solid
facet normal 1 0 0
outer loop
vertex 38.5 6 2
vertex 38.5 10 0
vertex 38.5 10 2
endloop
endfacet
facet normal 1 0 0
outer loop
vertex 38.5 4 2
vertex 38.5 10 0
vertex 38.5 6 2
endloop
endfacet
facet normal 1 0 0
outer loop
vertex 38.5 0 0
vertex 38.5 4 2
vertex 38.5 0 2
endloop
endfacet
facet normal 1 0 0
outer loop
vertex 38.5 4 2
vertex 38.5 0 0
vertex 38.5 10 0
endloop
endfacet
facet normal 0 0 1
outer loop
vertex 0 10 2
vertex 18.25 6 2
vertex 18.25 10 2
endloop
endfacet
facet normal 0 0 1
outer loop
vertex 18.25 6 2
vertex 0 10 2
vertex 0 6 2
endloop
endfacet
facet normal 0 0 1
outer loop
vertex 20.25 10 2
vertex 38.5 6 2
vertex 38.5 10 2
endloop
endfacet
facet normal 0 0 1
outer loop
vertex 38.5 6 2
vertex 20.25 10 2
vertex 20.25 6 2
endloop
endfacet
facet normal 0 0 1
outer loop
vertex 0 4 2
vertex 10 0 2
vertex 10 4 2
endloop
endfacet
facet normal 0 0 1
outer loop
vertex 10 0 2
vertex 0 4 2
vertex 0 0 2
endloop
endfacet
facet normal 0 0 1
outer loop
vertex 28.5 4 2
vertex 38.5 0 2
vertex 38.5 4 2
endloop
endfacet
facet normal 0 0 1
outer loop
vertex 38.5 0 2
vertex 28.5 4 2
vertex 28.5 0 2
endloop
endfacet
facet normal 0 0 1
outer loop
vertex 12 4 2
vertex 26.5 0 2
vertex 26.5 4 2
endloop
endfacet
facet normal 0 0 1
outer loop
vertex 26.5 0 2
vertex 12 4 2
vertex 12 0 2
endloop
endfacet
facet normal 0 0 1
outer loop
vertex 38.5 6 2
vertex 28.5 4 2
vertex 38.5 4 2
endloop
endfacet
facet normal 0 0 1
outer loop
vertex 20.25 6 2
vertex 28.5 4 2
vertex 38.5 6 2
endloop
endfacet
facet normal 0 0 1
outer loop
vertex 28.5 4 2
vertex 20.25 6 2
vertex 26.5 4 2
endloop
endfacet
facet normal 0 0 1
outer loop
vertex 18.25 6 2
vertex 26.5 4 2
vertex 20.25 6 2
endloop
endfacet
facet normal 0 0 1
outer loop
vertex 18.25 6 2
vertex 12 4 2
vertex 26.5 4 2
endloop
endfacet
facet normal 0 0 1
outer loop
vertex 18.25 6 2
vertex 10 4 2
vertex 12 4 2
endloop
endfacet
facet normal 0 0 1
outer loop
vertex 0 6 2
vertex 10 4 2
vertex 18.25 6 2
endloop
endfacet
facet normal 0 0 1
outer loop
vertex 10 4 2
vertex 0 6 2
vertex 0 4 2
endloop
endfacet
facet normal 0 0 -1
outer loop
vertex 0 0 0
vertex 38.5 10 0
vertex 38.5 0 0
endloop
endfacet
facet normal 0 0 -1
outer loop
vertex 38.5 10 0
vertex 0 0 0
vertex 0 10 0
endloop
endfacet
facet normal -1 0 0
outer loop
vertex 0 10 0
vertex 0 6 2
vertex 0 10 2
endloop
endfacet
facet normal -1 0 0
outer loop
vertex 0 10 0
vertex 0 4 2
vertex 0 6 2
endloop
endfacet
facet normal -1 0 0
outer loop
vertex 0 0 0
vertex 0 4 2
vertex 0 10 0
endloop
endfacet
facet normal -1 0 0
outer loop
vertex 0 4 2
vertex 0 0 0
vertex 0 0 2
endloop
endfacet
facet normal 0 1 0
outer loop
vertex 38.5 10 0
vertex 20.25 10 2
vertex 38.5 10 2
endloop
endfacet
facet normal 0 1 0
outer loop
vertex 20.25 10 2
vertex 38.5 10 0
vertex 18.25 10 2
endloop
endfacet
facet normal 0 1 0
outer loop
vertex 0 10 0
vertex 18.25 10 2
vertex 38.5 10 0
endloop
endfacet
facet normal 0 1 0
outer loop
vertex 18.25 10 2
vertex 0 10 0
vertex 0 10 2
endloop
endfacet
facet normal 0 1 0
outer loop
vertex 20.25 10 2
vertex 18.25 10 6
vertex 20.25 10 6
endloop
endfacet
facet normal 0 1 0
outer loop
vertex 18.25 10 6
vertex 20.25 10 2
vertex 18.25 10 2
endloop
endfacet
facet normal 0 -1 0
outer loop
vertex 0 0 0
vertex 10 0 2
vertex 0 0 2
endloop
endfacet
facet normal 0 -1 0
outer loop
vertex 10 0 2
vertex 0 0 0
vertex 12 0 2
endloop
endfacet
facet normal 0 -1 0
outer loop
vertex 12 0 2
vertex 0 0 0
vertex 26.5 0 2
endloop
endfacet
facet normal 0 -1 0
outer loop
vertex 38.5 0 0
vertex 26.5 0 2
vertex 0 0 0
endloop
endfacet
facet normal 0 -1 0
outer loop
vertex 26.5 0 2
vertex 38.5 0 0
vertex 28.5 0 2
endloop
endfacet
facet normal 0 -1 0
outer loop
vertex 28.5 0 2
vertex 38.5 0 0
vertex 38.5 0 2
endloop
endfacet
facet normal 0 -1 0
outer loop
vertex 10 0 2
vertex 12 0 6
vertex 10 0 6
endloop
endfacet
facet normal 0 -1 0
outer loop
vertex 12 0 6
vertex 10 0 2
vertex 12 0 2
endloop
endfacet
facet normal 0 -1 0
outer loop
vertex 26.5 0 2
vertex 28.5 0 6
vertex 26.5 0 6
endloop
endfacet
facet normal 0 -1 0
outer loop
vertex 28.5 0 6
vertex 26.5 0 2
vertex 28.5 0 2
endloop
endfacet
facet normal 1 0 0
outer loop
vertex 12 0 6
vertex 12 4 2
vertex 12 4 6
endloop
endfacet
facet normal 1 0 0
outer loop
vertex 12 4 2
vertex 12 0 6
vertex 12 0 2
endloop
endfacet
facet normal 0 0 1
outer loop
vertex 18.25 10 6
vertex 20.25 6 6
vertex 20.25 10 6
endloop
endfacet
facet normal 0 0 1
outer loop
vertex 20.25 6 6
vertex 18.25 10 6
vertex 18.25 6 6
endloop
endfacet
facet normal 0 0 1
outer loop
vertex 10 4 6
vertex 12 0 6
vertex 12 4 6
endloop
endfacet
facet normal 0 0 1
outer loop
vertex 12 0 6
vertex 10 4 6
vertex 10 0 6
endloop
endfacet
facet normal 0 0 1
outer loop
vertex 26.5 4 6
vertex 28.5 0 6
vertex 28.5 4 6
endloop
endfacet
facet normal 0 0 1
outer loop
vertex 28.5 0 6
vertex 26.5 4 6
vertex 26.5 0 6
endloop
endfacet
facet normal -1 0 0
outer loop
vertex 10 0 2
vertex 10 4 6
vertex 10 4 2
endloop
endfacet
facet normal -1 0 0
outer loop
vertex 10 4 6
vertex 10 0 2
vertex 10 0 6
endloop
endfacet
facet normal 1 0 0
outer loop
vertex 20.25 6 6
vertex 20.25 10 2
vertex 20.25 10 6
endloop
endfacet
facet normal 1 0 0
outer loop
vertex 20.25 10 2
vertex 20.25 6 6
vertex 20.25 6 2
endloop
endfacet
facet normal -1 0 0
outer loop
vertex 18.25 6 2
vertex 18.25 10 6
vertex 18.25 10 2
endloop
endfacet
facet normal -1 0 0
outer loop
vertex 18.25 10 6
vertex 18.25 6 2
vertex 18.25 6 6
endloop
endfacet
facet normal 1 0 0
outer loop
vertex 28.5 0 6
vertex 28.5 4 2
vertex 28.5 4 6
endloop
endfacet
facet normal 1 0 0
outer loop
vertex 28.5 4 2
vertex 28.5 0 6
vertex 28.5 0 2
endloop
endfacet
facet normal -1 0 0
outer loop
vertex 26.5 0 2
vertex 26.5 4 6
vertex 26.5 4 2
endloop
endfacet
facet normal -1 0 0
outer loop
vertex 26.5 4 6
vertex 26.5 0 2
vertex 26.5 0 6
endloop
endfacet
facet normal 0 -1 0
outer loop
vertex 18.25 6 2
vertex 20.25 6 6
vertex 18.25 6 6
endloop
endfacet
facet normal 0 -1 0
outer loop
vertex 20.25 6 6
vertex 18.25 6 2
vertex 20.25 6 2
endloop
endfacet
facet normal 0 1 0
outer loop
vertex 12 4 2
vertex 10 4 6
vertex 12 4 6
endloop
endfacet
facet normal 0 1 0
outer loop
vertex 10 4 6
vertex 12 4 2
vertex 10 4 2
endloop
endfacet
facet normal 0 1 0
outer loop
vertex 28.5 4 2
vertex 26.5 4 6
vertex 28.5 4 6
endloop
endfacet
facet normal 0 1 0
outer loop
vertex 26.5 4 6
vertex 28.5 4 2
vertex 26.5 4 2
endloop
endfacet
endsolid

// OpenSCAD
// How wide should the slot be that is cut down the middle? e.g. (How thick is your card, in millimeters?)
slotWidth = 2; // the slot width in millimeters
slotOffset = (10 - slotWidth)/2;


difference() {
	// Draw the base and the three vertical bars
	union() {
		translate([0,0,0]) {
			cube([38.5, 10, 2]);
		}
		translate([10,0,2]) {
			cube([2,5,4]);
		}
		translate([18.25,5,2]) {
			cube([2,5,4]);
		}
		translate([26.5,0,2]) {
			cube([2,5,4]);
		}
	}
	// Cut out a slot down the middle for the card to fit into
	translate([0,slotOffset,2]) {
		cube([38.5,slotWidth,4]);
	}
}
